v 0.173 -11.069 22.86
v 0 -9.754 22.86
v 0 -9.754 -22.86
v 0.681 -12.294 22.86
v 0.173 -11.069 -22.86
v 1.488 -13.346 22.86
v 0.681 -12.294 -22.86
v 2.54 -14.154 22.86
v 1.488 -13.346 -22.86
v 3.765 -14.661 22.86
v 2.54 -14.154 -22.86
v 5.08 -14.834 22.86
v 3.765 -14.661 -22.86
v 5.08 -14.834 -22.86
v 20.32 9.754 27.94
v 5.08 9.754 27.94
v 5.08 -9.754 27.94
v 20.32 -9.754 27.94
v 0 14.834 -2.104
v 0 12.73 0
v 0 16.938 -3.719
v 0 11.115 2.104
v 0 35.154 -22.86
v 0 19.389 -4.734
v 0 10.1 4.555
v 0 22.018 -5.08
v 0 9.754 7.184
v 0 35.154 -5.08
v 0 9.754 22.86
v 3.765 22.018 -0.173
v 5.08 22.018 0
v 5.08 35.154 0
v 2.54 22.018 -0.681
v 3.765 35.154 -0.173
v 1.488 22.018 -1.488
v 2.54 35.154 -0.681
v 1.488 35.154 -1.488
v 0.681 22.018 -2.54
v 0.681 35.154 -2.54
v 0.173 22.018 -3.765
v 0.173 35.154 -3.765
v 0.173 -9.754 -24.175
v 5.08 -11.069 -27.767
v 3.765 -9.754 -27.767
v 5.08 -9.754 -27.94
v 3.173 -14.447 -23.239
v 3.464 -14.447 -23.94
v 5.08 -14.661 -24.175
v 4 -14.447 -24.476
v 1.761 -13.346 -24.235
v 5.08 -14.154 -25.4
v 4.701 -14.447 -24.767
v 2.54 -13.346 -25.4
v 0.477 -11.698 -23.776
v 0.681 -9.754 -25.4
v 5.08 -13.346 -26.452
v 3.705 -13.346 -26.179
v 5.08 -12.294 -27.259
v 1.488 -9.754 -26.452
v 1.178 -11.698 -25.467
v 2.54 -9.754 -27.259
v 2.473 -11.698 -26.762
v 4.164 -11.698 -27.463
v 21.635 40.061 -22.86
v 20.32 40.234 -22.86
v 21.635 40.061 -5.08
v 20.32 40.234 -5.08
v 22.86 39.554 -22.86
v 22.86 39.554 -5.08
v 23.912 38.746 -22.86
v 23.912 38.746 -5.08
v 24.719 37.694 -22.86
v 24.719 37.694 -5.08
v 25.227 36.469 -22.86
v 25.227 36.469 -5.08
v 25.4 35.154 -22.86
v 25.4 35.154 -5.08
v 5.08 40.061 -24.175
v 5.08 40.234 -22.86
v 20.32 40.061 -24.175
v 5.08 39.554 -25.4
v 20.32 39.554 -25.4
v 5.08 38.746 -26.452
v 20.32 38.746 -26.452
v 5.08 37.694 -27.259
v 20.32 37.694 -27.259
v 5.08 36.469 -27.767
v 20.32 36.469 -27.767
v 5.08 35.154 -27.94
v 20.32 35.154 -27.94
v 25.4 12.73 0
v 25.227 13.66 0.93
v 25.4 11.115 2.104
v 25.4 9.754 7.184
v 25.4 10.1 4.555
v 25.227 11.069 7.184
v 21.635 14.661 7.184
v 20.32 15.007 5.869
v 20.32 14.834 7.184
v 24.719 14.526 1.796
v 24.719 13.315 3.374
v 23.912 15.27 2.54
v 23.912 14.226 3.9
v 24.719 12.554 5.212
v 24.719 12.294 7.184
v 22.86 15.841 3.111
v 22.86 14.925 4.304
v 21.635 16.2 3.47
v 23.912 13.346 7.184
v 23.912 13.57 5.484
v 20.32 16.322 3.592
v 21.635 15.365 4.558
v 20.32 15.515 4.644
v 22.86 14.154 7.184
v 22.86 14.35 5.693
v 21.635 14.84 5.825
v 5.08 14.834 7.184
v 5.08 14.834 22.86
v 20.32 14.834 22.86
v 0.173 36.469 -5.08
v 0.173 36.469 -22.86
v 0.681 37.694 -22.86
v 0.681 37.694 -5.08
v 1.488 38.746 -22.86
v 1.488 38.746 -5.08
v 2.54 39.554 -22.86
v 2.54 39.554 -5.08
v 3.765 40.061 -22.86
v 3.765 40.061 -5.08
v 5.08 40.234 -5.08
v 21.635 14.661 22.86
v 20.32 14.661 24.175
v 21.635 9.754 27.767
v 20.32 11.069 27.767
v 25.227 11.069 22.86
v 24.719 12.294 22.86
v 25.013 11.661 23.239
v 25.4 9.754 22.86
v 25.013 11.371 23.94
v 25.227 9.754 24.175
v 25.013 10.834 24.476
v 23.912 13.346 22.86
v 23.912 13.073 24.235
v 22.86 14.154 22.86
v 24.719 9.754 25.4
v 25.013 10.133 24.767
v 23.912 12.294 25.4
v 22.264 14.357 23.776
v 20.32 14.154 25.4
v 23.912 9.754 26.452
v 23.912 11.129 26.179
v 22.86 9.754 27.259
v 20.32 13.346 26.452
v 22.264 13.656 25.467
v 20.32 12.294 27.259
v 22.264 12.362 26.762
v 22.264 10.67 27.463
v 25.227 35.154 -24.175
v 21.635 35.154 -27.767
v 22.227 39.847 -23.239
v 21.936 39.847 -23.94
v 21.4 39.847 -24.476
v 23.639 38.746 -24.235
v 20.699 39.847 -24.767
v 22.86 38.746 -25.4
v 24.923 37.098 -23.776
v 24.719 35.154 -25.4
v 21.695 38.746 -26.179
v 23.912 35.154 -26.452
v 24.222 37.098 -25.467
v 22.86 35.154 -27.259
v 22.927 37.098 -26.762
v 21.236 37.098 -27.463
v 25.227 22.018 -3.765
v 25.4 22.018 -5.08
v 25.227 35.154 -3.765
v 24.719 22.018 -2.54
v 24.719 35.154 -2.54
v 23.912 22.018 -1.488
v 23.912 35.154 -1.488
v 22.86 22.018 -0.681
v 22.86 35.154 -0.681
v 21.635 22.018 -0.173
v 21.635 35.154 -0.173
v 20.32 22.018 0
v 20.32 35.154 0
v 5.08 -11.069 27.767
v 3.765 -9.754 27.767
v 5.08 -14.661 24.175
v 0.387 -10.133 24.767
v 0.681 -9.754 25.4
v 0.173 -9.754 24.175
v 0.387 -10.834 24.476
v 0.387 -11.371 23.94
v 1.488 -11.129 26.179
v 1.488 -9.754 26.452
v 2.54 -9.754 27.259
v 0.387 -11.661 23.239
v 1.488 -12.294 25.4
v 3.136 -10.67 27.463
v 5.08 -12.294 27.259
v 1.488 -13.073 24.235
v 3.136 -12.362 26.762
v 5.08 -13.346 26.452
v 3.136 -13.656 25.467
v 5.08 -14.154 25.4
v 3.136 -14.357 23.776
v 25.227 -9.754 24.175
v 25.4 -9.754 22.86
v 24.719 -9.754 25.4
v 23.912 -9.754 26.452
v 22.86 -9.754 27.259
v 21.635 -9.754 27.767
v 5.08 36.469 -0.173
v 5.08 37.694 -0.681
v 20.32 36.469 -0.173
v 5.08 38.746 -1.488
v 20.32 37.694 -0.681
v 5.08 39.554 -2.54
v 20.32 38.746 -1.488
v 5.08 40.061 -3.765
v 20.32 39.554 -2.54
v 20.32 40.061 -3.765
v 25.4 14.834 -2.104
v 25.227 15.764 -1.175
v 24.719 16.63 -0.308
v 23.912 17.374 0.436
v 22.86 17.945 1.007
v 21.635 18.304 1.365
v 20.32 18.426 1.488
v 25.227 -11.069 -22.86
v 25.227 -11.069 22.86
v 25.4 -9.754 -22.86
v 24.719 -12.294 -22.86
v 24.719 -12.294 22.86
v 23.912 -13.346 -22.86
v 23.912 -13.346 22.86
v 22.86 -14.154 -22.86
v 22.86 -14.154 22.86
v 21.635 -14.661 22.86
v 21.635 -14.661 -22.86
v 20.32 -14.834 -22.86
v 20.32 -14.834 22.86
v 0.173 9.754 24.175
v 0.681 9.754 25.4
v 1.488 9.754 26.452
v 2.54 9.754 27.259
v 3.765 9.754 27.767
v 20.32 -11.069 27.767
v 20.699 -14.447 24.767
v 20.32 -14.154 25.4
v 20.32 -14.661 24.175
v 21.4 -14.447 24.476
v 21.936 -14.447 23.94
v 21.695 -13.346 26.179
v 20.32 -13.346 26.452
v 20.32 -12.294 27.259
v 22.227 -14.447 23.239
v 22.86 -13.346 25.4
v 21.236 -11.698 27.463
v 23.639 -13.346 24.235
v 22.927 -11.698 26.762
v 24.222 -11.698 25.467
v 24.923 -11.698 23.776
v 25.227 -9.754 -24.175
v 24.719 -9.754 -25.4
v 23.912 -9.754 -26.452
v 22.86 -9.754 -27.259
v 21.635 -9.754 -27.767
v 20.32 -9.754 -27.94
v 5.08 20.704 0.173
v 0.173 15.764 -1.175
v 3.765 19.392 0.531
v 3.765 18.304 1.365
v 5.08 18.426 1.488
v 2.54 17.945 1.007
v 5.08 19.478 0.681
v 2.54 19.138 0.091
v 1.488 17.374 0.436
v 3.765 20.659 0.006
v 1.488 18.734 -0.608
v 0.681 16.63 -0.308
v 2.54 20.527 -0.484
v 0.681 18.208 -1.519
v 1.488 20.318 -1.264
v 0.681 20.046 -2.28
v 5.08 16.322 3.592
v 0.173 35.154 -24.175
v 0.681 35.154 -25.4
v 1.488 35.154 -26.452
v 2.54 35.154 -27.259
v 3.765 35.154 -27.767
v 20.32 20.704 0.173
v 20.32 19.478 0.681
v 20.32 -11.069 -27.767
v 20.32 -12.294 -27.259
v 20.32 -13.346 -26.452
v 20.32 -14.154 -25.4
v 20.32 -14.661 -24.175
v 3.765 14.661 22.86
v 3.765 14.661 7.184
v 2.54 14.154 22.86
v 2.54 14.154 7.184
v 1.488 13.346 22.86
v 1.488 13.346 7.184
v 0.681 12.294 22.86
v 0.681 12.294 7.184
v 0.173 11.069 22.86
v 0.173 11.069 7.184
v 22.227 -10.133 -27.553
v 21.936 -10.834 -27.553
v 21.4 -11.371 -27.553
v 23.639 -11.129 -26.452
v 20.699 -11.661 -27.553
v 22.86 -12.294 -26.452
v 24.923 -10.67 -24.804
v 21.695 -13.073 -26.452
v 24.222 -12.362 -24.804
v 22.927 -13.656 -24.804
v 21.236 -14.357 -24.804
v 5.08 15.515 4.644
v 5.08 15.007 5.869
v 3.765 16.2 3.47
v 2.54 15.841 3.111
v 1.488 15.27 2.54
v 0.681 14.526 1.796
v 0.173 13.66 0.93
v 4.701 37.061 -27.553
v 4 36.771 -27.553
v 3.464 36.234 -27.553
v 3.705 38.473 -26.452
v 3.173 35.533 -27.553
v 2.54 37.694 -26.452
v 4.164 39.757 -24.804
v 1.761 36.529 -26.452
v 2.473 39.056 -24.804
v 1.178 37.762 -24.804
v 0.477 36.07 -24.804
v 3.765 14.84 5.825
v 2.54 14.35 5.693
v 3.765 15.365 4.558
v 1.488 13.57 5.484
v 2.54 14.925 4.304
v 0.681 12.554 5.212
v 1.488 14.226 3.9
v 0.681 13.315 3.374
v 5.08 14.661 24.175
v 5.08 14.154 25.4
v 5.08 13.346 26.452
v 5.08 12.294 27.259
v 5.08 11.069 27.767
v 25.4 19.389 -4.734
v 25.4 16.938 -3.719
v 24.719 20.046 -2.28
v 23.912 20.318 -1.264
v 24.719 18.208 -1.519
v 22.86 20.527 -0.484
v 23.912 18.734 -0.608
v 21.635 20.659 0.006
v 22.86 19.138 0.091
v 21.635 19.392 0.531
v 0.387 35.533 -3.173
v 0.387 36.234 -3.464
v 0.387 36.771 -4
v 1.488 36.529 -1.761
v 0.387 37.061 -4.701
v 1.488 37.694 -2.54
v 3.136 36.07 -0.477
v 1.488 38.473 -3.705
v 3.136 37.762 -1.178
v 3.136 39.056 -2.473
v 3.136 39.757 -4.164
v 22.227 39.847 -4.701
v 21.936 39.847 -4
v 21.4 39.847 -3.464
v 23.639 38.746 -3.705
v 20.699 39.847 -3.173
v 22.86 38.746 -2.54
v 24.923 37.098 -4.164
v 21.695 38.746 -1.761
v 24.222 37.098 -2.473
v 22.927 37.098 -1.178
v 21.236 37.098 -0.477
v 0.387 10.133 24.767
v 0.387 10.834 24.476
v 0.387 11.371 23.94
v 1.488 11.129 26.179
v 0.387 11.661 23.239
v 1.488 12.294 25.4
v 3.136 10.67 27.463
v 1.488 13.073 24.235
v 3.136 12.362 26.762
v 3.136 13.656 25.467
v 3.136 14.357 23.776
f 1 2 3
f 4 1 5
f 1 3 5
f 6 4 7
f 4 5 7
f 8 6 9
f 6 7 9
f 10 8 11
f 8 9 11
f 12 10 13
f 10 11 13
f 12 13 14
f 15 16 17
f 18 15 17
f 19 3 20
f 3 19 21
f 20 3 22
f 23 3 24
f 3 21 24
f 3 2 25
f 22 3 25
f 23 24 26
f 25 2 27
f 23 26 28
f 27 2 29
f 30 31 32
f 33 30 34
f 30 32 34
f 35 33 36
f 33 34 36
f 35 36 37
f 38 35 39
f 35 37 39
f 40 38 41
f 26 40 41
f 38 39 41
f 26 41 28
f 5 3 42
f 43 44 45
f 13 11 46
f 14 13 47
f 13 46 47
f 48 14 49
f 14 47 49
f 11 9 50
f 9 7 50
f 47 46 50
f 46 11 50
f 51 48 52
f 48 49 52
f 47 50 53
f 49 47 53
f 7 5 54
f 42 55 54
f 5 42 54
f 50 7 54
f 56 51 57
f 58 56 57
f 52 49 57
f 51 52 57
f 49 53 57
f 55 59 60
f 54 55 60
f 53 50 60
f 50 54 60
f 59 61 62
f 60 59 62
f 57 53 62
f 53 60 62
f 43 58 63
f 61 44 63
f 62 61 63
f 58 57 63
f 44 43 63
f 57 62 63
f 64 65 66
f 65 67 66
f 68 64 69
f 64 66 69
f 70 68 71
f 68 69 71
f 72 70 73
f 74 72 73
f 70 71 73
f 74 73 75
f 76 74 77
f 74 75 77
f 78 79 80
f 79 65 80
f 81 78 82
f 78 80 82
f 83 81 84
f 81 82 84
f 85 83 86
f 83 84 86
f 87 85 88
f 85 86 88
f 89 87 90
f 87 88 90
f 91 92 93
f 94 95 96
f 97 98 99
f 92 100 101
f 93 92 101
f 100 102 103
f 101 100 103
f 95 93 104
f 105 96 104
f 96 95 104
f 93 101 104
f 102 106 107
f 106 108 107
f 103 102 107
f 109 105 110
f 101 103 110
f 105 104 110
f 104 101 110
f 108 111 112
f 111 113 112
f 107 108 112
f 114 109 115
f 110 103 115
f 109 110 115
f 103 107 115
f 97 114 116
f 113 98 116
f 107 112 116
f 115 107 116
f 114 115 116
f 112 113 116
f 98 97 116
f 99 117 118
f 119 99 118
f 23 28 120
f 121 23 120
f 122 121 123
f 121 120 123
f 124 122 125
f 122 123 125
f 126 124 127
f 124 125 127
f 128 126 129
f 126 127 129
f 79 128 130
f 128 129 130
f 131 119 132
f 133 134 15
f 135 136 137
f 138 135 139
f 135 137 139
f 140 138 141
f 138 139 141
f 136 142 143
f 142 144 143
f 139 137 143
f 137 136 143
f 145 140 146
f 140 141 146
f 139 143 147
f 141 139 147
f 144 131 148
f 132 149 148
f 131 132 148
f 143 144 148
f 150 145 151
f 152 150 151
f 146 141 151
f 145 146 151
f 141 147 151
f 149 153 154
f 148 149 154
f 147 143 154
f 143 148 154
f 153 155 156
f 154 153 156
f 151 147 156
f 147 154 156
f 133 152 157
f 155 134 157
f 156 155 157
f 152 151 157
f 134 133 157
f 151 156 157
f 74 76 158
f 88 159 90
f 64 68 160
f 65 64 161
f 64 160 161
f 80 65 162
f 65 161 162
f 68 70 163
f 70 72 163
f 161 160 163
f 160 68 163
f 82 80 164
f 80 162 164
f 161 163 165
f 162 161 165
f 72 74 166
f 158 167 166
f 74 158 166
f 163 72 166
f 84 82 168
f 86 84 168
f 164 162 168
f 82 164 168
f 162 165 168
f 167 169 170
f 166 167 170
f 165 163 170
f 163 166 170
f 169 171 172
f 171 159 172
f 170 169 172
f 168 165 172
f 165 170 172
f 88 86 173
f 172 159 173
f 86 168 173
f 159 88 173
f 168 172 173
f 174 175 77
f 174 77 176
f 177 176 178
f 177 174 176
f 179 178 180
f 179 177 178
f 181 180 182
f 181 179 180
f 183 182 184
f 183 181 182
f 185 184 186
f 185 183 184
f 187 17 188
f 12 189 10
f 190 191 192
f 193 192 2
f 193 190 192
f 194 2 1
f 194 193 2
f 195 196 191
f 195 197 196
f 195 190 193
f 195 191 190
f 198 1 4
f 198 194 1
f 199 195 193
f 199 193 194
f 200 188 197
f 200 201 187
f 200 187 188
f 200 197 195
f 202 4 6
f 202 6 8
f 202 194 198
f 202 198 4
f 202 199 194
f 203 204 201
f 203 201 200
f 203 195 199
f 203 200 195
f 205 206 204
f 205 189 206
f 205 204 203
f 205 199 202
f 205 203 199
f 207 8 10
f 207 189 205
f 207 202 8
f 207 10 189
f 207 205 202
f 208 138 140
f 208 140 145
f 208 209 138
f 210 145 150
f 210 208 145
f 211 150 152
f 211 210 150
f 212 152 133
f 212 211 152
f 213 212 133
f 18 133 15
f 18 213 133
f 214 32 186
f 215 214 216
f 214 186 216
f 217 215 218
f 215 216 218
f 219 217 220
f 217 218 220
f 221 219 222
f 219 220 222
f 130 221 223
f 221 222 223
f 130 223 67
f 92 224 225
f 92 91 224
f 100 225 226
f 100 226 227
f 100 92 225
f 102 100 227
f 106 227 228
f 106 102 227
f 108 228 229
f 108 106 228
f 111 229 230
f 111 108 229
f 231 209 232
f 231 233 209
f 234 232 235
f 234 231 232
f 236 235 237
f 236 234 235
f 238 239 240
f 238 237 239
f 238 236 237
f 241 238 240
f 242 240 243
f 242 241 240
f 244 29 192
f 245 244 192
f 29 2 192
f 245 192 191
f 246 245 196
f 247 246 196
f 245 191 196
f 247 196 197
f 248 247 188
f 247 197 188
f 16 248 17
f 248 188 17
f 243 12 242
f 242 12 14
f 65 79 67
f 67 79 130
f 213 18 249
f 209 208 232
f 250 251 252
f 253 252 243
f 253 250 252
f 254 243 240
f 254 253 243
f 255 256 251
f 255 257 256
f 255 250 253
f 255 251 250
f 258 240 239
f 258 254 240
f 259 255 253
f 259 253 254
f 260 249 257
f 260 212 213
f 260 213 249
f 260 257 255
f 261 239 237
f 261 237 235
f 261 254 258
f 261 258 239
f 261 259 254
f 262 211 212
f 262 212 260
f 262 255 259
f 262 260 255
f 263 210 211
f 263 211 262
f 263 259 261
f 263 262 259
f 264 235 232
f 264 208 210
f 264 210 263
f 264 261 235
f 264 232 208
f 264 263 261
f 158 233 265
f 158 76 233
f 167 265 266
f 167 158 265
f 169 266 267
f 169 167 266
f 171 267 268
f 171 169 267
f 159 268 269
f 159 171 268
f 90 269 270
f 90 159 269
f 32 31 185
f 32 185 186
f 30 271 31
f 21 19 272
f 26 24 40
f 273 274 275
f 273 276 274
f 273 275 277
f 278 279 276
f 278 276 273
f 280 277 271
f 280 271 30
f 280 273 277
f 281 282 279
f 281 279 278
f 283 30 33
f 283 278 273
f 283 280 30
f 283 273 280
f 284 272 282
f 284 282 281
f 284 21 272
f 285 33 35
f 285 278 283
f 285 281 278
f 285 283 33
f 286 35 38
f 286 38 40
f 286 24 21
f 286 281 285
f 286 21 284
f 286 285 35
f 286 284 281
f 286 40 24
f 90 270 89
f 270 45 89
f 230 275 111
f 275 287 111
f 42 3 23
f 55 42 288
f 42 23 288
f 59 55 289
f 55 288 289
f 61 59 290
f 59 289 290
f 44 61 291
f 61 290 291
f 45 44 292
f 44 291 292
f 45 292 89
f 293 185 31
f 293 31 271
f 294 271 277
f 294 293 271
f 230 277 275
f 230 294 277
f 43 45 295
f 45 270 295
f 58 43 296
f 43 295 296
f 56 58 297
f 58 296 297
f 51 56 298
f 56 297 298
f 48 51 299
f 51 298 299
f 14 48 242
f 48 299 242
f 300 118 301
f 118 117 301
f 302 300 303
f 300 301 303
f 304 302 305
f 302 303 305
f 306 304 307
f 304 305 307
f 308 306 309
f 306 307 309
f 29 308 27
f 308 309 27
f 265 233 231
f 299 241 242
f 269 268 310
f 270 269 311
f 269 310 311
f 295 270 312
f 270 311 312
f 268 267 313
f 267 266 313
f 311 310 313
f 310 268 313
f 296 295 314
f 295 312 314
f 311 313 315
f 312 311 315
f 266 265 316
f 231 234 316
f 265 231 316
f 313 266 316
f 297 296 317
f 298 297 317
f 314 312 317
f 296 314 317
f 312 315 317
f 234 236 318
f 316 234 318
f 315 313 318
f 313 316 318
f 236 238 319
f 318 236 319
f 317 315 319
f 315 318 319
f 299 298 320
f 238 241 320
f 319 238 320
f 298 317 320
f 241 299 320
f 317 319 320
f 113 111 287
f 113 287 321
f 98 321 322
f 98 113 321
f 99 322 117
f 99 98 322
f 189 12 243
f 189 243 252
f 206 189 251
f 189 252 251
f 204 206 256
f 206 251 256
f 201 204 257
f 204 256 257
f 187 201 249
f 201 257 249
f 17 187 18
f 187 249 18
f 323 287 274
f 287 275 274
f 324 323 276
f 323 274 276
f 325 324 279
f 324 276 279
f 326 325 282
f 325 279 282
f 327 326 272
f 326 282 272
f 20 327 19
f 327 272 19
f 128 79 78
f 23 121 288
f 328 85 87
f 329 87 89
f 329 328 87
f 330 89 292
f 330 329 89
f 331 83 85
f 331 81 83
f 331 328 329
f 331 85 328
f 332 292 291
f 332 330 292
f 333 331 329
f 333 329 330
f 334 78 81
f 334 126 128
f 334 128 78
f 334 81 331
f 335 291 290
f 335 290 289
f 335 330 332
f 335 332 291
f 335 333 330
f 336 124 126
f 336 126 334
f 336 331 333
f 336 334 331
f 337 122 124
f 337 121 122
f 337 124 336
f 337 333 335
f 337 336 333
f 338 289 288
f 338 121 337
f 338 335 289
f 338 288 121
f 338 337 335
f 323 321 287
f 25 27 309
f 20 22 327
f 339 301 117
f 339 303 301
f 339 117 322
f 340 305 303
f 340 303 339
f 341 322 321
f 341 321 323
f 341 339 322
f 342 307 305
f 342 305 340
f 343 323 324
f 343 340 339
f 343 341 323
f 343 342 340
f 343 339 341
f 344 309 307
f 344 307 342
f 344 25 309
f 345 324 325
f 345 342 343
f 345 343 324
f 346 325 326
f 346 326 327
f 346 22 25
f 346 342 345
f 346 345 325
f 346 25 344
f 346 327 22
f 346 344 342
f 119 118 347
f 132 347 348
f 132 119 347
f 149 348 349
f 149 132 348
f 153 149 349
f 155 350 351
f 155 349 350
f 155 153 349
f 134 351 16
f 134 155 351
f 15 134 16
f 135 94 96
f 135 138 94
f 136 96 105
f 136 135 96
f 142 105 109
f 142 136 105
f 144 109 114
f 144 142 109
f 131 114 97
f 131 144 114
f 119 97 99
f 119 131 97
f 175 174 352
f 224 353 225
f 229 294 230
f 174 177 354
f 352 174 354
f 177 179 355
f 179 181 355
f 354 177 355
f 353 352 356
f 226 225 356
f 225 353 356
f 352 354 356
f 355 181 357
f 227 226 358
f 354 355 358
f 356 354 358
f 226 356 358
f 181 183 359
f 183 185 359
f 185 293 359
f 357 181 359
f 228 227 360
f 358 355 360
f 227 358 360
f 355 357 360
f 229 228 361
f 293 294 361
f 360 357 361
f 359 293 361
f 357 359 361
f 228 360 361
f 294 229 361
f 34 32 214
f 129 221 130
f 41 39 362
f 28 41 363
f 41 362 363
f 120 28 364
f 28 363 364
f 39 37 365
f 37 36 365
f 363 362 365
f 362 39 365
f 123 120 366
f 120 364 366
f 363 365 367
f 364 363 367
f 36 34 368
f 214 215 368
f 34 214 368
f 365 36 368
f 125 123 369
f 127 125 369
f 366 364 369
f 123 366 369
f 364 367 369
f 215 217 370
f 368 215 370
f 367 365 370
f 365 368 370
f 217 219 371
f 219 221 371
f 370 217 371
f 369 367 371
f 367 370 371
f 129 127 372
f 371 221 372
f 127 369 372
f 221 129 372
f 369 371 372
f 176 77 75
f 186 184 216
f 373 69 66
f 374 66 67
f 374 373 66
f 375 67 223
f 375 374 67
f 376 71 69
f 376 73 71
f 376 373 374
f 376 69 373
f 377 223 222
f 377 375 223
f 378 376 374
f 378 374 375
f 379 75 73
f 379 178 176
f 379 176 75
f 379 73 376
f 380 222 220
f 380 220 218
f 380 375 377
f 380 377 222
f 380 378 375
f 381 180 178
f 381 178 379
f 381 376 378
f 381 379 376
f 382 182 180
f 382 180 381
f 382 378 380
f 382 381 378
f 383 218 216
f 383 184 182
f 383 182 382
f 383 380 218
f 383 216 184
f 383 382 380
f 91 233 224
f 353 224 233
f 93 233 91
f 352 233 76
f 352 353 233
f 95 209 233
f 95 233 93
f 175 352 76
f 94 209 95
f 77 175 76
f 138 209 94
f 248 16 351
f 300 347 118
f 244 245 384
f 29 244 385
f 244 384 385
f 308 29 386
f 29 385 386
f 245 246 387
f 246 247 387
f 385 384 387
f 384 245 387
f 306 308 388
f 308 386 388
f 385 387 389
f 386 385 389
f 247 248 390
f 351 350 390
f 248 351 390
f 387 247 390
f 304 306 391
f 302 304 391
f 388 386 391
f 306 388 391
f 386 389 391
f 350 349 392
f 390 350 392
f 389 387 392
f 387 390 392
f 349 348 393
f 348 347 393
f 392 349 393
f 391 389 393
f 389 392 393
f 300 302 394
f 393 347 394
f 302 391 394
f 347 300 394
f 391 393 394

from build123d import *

# Parameters (mm, degrees)
F0_W     = 25.4
F0_H     = 27.94
F1_DEPTH = 25.4
F2_SIZE  = 5.08
F3_F1_R  = 5.08
F3_F2_R  = 5.08


with BuildPart() as f1:
    # F0 (on Right) → F1 (new body)
    with BuildSketch(Plane.YZ):
        Polygon((-14.8341231188, -27.94), (14.8341231188, -27.94), (14.8341231188, 0), (14.8341231188, 27.94), (-14.8341231188, 27.94), align=None)
        with Locations((27.5341231188, -13.97)):
            Rectangle(F0_W, F0_H)
    extrude(amount=F1_DEPTH)

    # F2
    f2_edges = [f1.edges().sort_by_distance(p)[0] for p in [
        (12.7, 14.834123, 0),
    ]]
    chamfer(f2_edges, length=F2_SIZE)

    # F3: fillet of radius 5.08 on 20 edges, made by hand

    # F3_f1
    f3_f1_edges = [f1.edges().sort_by_distance(p)[0] for p in [
        (12.7, 14.8341231188, 5.08),
        (12.7, 19.9141231188, 0),
    ]]
    fillet(f3_f1_edges, radius=F3_F1_R)

    # F3_f2
    f3_f2_edges = [f1.edges().sort_by_distance(p)[0] for p in [
        (12.7, 14.8341231188, 27.94),
        (25.4, 14.8341231188, 17.5621024484),
        (25.4, 0, 27.94),
        (12.7, -14.8341231188, 27.94),
        (0, 0, 27.94),
        (25.4, -14.8341231188, 0),
        (25.4, 12.7, -27.94),
        (25.4, 31.1262255672, 0),
        (25.4, 40.2341231188, -13.97),
        (12.7, 40.2341231188, 0),
        (0, 31.1262255672, 0),
        (0, 40.2341231188, -13.97),
        (12.7, 40.2341231188, -27.94),
        (0, 17.3741231188, 2.54),
        (25.4, 17.3741231188, 2.54),
        (0, 12.7, -27.94),
        (0, -14.8341231188, 0),
        (12.7, -14.8341231188, -27.94),
        (25.4, 20.0742961792, 0.3866919748),
        (25.4, 15.2208150936, 5.2401730604),
        (0, 20.0742961792, 0.3866919748),
        (0, 15.2208150936, 5.2401730604),
    ]]
    fillet(f3_f2_edges, radius=F3_F2_R)


solid = f1.part
